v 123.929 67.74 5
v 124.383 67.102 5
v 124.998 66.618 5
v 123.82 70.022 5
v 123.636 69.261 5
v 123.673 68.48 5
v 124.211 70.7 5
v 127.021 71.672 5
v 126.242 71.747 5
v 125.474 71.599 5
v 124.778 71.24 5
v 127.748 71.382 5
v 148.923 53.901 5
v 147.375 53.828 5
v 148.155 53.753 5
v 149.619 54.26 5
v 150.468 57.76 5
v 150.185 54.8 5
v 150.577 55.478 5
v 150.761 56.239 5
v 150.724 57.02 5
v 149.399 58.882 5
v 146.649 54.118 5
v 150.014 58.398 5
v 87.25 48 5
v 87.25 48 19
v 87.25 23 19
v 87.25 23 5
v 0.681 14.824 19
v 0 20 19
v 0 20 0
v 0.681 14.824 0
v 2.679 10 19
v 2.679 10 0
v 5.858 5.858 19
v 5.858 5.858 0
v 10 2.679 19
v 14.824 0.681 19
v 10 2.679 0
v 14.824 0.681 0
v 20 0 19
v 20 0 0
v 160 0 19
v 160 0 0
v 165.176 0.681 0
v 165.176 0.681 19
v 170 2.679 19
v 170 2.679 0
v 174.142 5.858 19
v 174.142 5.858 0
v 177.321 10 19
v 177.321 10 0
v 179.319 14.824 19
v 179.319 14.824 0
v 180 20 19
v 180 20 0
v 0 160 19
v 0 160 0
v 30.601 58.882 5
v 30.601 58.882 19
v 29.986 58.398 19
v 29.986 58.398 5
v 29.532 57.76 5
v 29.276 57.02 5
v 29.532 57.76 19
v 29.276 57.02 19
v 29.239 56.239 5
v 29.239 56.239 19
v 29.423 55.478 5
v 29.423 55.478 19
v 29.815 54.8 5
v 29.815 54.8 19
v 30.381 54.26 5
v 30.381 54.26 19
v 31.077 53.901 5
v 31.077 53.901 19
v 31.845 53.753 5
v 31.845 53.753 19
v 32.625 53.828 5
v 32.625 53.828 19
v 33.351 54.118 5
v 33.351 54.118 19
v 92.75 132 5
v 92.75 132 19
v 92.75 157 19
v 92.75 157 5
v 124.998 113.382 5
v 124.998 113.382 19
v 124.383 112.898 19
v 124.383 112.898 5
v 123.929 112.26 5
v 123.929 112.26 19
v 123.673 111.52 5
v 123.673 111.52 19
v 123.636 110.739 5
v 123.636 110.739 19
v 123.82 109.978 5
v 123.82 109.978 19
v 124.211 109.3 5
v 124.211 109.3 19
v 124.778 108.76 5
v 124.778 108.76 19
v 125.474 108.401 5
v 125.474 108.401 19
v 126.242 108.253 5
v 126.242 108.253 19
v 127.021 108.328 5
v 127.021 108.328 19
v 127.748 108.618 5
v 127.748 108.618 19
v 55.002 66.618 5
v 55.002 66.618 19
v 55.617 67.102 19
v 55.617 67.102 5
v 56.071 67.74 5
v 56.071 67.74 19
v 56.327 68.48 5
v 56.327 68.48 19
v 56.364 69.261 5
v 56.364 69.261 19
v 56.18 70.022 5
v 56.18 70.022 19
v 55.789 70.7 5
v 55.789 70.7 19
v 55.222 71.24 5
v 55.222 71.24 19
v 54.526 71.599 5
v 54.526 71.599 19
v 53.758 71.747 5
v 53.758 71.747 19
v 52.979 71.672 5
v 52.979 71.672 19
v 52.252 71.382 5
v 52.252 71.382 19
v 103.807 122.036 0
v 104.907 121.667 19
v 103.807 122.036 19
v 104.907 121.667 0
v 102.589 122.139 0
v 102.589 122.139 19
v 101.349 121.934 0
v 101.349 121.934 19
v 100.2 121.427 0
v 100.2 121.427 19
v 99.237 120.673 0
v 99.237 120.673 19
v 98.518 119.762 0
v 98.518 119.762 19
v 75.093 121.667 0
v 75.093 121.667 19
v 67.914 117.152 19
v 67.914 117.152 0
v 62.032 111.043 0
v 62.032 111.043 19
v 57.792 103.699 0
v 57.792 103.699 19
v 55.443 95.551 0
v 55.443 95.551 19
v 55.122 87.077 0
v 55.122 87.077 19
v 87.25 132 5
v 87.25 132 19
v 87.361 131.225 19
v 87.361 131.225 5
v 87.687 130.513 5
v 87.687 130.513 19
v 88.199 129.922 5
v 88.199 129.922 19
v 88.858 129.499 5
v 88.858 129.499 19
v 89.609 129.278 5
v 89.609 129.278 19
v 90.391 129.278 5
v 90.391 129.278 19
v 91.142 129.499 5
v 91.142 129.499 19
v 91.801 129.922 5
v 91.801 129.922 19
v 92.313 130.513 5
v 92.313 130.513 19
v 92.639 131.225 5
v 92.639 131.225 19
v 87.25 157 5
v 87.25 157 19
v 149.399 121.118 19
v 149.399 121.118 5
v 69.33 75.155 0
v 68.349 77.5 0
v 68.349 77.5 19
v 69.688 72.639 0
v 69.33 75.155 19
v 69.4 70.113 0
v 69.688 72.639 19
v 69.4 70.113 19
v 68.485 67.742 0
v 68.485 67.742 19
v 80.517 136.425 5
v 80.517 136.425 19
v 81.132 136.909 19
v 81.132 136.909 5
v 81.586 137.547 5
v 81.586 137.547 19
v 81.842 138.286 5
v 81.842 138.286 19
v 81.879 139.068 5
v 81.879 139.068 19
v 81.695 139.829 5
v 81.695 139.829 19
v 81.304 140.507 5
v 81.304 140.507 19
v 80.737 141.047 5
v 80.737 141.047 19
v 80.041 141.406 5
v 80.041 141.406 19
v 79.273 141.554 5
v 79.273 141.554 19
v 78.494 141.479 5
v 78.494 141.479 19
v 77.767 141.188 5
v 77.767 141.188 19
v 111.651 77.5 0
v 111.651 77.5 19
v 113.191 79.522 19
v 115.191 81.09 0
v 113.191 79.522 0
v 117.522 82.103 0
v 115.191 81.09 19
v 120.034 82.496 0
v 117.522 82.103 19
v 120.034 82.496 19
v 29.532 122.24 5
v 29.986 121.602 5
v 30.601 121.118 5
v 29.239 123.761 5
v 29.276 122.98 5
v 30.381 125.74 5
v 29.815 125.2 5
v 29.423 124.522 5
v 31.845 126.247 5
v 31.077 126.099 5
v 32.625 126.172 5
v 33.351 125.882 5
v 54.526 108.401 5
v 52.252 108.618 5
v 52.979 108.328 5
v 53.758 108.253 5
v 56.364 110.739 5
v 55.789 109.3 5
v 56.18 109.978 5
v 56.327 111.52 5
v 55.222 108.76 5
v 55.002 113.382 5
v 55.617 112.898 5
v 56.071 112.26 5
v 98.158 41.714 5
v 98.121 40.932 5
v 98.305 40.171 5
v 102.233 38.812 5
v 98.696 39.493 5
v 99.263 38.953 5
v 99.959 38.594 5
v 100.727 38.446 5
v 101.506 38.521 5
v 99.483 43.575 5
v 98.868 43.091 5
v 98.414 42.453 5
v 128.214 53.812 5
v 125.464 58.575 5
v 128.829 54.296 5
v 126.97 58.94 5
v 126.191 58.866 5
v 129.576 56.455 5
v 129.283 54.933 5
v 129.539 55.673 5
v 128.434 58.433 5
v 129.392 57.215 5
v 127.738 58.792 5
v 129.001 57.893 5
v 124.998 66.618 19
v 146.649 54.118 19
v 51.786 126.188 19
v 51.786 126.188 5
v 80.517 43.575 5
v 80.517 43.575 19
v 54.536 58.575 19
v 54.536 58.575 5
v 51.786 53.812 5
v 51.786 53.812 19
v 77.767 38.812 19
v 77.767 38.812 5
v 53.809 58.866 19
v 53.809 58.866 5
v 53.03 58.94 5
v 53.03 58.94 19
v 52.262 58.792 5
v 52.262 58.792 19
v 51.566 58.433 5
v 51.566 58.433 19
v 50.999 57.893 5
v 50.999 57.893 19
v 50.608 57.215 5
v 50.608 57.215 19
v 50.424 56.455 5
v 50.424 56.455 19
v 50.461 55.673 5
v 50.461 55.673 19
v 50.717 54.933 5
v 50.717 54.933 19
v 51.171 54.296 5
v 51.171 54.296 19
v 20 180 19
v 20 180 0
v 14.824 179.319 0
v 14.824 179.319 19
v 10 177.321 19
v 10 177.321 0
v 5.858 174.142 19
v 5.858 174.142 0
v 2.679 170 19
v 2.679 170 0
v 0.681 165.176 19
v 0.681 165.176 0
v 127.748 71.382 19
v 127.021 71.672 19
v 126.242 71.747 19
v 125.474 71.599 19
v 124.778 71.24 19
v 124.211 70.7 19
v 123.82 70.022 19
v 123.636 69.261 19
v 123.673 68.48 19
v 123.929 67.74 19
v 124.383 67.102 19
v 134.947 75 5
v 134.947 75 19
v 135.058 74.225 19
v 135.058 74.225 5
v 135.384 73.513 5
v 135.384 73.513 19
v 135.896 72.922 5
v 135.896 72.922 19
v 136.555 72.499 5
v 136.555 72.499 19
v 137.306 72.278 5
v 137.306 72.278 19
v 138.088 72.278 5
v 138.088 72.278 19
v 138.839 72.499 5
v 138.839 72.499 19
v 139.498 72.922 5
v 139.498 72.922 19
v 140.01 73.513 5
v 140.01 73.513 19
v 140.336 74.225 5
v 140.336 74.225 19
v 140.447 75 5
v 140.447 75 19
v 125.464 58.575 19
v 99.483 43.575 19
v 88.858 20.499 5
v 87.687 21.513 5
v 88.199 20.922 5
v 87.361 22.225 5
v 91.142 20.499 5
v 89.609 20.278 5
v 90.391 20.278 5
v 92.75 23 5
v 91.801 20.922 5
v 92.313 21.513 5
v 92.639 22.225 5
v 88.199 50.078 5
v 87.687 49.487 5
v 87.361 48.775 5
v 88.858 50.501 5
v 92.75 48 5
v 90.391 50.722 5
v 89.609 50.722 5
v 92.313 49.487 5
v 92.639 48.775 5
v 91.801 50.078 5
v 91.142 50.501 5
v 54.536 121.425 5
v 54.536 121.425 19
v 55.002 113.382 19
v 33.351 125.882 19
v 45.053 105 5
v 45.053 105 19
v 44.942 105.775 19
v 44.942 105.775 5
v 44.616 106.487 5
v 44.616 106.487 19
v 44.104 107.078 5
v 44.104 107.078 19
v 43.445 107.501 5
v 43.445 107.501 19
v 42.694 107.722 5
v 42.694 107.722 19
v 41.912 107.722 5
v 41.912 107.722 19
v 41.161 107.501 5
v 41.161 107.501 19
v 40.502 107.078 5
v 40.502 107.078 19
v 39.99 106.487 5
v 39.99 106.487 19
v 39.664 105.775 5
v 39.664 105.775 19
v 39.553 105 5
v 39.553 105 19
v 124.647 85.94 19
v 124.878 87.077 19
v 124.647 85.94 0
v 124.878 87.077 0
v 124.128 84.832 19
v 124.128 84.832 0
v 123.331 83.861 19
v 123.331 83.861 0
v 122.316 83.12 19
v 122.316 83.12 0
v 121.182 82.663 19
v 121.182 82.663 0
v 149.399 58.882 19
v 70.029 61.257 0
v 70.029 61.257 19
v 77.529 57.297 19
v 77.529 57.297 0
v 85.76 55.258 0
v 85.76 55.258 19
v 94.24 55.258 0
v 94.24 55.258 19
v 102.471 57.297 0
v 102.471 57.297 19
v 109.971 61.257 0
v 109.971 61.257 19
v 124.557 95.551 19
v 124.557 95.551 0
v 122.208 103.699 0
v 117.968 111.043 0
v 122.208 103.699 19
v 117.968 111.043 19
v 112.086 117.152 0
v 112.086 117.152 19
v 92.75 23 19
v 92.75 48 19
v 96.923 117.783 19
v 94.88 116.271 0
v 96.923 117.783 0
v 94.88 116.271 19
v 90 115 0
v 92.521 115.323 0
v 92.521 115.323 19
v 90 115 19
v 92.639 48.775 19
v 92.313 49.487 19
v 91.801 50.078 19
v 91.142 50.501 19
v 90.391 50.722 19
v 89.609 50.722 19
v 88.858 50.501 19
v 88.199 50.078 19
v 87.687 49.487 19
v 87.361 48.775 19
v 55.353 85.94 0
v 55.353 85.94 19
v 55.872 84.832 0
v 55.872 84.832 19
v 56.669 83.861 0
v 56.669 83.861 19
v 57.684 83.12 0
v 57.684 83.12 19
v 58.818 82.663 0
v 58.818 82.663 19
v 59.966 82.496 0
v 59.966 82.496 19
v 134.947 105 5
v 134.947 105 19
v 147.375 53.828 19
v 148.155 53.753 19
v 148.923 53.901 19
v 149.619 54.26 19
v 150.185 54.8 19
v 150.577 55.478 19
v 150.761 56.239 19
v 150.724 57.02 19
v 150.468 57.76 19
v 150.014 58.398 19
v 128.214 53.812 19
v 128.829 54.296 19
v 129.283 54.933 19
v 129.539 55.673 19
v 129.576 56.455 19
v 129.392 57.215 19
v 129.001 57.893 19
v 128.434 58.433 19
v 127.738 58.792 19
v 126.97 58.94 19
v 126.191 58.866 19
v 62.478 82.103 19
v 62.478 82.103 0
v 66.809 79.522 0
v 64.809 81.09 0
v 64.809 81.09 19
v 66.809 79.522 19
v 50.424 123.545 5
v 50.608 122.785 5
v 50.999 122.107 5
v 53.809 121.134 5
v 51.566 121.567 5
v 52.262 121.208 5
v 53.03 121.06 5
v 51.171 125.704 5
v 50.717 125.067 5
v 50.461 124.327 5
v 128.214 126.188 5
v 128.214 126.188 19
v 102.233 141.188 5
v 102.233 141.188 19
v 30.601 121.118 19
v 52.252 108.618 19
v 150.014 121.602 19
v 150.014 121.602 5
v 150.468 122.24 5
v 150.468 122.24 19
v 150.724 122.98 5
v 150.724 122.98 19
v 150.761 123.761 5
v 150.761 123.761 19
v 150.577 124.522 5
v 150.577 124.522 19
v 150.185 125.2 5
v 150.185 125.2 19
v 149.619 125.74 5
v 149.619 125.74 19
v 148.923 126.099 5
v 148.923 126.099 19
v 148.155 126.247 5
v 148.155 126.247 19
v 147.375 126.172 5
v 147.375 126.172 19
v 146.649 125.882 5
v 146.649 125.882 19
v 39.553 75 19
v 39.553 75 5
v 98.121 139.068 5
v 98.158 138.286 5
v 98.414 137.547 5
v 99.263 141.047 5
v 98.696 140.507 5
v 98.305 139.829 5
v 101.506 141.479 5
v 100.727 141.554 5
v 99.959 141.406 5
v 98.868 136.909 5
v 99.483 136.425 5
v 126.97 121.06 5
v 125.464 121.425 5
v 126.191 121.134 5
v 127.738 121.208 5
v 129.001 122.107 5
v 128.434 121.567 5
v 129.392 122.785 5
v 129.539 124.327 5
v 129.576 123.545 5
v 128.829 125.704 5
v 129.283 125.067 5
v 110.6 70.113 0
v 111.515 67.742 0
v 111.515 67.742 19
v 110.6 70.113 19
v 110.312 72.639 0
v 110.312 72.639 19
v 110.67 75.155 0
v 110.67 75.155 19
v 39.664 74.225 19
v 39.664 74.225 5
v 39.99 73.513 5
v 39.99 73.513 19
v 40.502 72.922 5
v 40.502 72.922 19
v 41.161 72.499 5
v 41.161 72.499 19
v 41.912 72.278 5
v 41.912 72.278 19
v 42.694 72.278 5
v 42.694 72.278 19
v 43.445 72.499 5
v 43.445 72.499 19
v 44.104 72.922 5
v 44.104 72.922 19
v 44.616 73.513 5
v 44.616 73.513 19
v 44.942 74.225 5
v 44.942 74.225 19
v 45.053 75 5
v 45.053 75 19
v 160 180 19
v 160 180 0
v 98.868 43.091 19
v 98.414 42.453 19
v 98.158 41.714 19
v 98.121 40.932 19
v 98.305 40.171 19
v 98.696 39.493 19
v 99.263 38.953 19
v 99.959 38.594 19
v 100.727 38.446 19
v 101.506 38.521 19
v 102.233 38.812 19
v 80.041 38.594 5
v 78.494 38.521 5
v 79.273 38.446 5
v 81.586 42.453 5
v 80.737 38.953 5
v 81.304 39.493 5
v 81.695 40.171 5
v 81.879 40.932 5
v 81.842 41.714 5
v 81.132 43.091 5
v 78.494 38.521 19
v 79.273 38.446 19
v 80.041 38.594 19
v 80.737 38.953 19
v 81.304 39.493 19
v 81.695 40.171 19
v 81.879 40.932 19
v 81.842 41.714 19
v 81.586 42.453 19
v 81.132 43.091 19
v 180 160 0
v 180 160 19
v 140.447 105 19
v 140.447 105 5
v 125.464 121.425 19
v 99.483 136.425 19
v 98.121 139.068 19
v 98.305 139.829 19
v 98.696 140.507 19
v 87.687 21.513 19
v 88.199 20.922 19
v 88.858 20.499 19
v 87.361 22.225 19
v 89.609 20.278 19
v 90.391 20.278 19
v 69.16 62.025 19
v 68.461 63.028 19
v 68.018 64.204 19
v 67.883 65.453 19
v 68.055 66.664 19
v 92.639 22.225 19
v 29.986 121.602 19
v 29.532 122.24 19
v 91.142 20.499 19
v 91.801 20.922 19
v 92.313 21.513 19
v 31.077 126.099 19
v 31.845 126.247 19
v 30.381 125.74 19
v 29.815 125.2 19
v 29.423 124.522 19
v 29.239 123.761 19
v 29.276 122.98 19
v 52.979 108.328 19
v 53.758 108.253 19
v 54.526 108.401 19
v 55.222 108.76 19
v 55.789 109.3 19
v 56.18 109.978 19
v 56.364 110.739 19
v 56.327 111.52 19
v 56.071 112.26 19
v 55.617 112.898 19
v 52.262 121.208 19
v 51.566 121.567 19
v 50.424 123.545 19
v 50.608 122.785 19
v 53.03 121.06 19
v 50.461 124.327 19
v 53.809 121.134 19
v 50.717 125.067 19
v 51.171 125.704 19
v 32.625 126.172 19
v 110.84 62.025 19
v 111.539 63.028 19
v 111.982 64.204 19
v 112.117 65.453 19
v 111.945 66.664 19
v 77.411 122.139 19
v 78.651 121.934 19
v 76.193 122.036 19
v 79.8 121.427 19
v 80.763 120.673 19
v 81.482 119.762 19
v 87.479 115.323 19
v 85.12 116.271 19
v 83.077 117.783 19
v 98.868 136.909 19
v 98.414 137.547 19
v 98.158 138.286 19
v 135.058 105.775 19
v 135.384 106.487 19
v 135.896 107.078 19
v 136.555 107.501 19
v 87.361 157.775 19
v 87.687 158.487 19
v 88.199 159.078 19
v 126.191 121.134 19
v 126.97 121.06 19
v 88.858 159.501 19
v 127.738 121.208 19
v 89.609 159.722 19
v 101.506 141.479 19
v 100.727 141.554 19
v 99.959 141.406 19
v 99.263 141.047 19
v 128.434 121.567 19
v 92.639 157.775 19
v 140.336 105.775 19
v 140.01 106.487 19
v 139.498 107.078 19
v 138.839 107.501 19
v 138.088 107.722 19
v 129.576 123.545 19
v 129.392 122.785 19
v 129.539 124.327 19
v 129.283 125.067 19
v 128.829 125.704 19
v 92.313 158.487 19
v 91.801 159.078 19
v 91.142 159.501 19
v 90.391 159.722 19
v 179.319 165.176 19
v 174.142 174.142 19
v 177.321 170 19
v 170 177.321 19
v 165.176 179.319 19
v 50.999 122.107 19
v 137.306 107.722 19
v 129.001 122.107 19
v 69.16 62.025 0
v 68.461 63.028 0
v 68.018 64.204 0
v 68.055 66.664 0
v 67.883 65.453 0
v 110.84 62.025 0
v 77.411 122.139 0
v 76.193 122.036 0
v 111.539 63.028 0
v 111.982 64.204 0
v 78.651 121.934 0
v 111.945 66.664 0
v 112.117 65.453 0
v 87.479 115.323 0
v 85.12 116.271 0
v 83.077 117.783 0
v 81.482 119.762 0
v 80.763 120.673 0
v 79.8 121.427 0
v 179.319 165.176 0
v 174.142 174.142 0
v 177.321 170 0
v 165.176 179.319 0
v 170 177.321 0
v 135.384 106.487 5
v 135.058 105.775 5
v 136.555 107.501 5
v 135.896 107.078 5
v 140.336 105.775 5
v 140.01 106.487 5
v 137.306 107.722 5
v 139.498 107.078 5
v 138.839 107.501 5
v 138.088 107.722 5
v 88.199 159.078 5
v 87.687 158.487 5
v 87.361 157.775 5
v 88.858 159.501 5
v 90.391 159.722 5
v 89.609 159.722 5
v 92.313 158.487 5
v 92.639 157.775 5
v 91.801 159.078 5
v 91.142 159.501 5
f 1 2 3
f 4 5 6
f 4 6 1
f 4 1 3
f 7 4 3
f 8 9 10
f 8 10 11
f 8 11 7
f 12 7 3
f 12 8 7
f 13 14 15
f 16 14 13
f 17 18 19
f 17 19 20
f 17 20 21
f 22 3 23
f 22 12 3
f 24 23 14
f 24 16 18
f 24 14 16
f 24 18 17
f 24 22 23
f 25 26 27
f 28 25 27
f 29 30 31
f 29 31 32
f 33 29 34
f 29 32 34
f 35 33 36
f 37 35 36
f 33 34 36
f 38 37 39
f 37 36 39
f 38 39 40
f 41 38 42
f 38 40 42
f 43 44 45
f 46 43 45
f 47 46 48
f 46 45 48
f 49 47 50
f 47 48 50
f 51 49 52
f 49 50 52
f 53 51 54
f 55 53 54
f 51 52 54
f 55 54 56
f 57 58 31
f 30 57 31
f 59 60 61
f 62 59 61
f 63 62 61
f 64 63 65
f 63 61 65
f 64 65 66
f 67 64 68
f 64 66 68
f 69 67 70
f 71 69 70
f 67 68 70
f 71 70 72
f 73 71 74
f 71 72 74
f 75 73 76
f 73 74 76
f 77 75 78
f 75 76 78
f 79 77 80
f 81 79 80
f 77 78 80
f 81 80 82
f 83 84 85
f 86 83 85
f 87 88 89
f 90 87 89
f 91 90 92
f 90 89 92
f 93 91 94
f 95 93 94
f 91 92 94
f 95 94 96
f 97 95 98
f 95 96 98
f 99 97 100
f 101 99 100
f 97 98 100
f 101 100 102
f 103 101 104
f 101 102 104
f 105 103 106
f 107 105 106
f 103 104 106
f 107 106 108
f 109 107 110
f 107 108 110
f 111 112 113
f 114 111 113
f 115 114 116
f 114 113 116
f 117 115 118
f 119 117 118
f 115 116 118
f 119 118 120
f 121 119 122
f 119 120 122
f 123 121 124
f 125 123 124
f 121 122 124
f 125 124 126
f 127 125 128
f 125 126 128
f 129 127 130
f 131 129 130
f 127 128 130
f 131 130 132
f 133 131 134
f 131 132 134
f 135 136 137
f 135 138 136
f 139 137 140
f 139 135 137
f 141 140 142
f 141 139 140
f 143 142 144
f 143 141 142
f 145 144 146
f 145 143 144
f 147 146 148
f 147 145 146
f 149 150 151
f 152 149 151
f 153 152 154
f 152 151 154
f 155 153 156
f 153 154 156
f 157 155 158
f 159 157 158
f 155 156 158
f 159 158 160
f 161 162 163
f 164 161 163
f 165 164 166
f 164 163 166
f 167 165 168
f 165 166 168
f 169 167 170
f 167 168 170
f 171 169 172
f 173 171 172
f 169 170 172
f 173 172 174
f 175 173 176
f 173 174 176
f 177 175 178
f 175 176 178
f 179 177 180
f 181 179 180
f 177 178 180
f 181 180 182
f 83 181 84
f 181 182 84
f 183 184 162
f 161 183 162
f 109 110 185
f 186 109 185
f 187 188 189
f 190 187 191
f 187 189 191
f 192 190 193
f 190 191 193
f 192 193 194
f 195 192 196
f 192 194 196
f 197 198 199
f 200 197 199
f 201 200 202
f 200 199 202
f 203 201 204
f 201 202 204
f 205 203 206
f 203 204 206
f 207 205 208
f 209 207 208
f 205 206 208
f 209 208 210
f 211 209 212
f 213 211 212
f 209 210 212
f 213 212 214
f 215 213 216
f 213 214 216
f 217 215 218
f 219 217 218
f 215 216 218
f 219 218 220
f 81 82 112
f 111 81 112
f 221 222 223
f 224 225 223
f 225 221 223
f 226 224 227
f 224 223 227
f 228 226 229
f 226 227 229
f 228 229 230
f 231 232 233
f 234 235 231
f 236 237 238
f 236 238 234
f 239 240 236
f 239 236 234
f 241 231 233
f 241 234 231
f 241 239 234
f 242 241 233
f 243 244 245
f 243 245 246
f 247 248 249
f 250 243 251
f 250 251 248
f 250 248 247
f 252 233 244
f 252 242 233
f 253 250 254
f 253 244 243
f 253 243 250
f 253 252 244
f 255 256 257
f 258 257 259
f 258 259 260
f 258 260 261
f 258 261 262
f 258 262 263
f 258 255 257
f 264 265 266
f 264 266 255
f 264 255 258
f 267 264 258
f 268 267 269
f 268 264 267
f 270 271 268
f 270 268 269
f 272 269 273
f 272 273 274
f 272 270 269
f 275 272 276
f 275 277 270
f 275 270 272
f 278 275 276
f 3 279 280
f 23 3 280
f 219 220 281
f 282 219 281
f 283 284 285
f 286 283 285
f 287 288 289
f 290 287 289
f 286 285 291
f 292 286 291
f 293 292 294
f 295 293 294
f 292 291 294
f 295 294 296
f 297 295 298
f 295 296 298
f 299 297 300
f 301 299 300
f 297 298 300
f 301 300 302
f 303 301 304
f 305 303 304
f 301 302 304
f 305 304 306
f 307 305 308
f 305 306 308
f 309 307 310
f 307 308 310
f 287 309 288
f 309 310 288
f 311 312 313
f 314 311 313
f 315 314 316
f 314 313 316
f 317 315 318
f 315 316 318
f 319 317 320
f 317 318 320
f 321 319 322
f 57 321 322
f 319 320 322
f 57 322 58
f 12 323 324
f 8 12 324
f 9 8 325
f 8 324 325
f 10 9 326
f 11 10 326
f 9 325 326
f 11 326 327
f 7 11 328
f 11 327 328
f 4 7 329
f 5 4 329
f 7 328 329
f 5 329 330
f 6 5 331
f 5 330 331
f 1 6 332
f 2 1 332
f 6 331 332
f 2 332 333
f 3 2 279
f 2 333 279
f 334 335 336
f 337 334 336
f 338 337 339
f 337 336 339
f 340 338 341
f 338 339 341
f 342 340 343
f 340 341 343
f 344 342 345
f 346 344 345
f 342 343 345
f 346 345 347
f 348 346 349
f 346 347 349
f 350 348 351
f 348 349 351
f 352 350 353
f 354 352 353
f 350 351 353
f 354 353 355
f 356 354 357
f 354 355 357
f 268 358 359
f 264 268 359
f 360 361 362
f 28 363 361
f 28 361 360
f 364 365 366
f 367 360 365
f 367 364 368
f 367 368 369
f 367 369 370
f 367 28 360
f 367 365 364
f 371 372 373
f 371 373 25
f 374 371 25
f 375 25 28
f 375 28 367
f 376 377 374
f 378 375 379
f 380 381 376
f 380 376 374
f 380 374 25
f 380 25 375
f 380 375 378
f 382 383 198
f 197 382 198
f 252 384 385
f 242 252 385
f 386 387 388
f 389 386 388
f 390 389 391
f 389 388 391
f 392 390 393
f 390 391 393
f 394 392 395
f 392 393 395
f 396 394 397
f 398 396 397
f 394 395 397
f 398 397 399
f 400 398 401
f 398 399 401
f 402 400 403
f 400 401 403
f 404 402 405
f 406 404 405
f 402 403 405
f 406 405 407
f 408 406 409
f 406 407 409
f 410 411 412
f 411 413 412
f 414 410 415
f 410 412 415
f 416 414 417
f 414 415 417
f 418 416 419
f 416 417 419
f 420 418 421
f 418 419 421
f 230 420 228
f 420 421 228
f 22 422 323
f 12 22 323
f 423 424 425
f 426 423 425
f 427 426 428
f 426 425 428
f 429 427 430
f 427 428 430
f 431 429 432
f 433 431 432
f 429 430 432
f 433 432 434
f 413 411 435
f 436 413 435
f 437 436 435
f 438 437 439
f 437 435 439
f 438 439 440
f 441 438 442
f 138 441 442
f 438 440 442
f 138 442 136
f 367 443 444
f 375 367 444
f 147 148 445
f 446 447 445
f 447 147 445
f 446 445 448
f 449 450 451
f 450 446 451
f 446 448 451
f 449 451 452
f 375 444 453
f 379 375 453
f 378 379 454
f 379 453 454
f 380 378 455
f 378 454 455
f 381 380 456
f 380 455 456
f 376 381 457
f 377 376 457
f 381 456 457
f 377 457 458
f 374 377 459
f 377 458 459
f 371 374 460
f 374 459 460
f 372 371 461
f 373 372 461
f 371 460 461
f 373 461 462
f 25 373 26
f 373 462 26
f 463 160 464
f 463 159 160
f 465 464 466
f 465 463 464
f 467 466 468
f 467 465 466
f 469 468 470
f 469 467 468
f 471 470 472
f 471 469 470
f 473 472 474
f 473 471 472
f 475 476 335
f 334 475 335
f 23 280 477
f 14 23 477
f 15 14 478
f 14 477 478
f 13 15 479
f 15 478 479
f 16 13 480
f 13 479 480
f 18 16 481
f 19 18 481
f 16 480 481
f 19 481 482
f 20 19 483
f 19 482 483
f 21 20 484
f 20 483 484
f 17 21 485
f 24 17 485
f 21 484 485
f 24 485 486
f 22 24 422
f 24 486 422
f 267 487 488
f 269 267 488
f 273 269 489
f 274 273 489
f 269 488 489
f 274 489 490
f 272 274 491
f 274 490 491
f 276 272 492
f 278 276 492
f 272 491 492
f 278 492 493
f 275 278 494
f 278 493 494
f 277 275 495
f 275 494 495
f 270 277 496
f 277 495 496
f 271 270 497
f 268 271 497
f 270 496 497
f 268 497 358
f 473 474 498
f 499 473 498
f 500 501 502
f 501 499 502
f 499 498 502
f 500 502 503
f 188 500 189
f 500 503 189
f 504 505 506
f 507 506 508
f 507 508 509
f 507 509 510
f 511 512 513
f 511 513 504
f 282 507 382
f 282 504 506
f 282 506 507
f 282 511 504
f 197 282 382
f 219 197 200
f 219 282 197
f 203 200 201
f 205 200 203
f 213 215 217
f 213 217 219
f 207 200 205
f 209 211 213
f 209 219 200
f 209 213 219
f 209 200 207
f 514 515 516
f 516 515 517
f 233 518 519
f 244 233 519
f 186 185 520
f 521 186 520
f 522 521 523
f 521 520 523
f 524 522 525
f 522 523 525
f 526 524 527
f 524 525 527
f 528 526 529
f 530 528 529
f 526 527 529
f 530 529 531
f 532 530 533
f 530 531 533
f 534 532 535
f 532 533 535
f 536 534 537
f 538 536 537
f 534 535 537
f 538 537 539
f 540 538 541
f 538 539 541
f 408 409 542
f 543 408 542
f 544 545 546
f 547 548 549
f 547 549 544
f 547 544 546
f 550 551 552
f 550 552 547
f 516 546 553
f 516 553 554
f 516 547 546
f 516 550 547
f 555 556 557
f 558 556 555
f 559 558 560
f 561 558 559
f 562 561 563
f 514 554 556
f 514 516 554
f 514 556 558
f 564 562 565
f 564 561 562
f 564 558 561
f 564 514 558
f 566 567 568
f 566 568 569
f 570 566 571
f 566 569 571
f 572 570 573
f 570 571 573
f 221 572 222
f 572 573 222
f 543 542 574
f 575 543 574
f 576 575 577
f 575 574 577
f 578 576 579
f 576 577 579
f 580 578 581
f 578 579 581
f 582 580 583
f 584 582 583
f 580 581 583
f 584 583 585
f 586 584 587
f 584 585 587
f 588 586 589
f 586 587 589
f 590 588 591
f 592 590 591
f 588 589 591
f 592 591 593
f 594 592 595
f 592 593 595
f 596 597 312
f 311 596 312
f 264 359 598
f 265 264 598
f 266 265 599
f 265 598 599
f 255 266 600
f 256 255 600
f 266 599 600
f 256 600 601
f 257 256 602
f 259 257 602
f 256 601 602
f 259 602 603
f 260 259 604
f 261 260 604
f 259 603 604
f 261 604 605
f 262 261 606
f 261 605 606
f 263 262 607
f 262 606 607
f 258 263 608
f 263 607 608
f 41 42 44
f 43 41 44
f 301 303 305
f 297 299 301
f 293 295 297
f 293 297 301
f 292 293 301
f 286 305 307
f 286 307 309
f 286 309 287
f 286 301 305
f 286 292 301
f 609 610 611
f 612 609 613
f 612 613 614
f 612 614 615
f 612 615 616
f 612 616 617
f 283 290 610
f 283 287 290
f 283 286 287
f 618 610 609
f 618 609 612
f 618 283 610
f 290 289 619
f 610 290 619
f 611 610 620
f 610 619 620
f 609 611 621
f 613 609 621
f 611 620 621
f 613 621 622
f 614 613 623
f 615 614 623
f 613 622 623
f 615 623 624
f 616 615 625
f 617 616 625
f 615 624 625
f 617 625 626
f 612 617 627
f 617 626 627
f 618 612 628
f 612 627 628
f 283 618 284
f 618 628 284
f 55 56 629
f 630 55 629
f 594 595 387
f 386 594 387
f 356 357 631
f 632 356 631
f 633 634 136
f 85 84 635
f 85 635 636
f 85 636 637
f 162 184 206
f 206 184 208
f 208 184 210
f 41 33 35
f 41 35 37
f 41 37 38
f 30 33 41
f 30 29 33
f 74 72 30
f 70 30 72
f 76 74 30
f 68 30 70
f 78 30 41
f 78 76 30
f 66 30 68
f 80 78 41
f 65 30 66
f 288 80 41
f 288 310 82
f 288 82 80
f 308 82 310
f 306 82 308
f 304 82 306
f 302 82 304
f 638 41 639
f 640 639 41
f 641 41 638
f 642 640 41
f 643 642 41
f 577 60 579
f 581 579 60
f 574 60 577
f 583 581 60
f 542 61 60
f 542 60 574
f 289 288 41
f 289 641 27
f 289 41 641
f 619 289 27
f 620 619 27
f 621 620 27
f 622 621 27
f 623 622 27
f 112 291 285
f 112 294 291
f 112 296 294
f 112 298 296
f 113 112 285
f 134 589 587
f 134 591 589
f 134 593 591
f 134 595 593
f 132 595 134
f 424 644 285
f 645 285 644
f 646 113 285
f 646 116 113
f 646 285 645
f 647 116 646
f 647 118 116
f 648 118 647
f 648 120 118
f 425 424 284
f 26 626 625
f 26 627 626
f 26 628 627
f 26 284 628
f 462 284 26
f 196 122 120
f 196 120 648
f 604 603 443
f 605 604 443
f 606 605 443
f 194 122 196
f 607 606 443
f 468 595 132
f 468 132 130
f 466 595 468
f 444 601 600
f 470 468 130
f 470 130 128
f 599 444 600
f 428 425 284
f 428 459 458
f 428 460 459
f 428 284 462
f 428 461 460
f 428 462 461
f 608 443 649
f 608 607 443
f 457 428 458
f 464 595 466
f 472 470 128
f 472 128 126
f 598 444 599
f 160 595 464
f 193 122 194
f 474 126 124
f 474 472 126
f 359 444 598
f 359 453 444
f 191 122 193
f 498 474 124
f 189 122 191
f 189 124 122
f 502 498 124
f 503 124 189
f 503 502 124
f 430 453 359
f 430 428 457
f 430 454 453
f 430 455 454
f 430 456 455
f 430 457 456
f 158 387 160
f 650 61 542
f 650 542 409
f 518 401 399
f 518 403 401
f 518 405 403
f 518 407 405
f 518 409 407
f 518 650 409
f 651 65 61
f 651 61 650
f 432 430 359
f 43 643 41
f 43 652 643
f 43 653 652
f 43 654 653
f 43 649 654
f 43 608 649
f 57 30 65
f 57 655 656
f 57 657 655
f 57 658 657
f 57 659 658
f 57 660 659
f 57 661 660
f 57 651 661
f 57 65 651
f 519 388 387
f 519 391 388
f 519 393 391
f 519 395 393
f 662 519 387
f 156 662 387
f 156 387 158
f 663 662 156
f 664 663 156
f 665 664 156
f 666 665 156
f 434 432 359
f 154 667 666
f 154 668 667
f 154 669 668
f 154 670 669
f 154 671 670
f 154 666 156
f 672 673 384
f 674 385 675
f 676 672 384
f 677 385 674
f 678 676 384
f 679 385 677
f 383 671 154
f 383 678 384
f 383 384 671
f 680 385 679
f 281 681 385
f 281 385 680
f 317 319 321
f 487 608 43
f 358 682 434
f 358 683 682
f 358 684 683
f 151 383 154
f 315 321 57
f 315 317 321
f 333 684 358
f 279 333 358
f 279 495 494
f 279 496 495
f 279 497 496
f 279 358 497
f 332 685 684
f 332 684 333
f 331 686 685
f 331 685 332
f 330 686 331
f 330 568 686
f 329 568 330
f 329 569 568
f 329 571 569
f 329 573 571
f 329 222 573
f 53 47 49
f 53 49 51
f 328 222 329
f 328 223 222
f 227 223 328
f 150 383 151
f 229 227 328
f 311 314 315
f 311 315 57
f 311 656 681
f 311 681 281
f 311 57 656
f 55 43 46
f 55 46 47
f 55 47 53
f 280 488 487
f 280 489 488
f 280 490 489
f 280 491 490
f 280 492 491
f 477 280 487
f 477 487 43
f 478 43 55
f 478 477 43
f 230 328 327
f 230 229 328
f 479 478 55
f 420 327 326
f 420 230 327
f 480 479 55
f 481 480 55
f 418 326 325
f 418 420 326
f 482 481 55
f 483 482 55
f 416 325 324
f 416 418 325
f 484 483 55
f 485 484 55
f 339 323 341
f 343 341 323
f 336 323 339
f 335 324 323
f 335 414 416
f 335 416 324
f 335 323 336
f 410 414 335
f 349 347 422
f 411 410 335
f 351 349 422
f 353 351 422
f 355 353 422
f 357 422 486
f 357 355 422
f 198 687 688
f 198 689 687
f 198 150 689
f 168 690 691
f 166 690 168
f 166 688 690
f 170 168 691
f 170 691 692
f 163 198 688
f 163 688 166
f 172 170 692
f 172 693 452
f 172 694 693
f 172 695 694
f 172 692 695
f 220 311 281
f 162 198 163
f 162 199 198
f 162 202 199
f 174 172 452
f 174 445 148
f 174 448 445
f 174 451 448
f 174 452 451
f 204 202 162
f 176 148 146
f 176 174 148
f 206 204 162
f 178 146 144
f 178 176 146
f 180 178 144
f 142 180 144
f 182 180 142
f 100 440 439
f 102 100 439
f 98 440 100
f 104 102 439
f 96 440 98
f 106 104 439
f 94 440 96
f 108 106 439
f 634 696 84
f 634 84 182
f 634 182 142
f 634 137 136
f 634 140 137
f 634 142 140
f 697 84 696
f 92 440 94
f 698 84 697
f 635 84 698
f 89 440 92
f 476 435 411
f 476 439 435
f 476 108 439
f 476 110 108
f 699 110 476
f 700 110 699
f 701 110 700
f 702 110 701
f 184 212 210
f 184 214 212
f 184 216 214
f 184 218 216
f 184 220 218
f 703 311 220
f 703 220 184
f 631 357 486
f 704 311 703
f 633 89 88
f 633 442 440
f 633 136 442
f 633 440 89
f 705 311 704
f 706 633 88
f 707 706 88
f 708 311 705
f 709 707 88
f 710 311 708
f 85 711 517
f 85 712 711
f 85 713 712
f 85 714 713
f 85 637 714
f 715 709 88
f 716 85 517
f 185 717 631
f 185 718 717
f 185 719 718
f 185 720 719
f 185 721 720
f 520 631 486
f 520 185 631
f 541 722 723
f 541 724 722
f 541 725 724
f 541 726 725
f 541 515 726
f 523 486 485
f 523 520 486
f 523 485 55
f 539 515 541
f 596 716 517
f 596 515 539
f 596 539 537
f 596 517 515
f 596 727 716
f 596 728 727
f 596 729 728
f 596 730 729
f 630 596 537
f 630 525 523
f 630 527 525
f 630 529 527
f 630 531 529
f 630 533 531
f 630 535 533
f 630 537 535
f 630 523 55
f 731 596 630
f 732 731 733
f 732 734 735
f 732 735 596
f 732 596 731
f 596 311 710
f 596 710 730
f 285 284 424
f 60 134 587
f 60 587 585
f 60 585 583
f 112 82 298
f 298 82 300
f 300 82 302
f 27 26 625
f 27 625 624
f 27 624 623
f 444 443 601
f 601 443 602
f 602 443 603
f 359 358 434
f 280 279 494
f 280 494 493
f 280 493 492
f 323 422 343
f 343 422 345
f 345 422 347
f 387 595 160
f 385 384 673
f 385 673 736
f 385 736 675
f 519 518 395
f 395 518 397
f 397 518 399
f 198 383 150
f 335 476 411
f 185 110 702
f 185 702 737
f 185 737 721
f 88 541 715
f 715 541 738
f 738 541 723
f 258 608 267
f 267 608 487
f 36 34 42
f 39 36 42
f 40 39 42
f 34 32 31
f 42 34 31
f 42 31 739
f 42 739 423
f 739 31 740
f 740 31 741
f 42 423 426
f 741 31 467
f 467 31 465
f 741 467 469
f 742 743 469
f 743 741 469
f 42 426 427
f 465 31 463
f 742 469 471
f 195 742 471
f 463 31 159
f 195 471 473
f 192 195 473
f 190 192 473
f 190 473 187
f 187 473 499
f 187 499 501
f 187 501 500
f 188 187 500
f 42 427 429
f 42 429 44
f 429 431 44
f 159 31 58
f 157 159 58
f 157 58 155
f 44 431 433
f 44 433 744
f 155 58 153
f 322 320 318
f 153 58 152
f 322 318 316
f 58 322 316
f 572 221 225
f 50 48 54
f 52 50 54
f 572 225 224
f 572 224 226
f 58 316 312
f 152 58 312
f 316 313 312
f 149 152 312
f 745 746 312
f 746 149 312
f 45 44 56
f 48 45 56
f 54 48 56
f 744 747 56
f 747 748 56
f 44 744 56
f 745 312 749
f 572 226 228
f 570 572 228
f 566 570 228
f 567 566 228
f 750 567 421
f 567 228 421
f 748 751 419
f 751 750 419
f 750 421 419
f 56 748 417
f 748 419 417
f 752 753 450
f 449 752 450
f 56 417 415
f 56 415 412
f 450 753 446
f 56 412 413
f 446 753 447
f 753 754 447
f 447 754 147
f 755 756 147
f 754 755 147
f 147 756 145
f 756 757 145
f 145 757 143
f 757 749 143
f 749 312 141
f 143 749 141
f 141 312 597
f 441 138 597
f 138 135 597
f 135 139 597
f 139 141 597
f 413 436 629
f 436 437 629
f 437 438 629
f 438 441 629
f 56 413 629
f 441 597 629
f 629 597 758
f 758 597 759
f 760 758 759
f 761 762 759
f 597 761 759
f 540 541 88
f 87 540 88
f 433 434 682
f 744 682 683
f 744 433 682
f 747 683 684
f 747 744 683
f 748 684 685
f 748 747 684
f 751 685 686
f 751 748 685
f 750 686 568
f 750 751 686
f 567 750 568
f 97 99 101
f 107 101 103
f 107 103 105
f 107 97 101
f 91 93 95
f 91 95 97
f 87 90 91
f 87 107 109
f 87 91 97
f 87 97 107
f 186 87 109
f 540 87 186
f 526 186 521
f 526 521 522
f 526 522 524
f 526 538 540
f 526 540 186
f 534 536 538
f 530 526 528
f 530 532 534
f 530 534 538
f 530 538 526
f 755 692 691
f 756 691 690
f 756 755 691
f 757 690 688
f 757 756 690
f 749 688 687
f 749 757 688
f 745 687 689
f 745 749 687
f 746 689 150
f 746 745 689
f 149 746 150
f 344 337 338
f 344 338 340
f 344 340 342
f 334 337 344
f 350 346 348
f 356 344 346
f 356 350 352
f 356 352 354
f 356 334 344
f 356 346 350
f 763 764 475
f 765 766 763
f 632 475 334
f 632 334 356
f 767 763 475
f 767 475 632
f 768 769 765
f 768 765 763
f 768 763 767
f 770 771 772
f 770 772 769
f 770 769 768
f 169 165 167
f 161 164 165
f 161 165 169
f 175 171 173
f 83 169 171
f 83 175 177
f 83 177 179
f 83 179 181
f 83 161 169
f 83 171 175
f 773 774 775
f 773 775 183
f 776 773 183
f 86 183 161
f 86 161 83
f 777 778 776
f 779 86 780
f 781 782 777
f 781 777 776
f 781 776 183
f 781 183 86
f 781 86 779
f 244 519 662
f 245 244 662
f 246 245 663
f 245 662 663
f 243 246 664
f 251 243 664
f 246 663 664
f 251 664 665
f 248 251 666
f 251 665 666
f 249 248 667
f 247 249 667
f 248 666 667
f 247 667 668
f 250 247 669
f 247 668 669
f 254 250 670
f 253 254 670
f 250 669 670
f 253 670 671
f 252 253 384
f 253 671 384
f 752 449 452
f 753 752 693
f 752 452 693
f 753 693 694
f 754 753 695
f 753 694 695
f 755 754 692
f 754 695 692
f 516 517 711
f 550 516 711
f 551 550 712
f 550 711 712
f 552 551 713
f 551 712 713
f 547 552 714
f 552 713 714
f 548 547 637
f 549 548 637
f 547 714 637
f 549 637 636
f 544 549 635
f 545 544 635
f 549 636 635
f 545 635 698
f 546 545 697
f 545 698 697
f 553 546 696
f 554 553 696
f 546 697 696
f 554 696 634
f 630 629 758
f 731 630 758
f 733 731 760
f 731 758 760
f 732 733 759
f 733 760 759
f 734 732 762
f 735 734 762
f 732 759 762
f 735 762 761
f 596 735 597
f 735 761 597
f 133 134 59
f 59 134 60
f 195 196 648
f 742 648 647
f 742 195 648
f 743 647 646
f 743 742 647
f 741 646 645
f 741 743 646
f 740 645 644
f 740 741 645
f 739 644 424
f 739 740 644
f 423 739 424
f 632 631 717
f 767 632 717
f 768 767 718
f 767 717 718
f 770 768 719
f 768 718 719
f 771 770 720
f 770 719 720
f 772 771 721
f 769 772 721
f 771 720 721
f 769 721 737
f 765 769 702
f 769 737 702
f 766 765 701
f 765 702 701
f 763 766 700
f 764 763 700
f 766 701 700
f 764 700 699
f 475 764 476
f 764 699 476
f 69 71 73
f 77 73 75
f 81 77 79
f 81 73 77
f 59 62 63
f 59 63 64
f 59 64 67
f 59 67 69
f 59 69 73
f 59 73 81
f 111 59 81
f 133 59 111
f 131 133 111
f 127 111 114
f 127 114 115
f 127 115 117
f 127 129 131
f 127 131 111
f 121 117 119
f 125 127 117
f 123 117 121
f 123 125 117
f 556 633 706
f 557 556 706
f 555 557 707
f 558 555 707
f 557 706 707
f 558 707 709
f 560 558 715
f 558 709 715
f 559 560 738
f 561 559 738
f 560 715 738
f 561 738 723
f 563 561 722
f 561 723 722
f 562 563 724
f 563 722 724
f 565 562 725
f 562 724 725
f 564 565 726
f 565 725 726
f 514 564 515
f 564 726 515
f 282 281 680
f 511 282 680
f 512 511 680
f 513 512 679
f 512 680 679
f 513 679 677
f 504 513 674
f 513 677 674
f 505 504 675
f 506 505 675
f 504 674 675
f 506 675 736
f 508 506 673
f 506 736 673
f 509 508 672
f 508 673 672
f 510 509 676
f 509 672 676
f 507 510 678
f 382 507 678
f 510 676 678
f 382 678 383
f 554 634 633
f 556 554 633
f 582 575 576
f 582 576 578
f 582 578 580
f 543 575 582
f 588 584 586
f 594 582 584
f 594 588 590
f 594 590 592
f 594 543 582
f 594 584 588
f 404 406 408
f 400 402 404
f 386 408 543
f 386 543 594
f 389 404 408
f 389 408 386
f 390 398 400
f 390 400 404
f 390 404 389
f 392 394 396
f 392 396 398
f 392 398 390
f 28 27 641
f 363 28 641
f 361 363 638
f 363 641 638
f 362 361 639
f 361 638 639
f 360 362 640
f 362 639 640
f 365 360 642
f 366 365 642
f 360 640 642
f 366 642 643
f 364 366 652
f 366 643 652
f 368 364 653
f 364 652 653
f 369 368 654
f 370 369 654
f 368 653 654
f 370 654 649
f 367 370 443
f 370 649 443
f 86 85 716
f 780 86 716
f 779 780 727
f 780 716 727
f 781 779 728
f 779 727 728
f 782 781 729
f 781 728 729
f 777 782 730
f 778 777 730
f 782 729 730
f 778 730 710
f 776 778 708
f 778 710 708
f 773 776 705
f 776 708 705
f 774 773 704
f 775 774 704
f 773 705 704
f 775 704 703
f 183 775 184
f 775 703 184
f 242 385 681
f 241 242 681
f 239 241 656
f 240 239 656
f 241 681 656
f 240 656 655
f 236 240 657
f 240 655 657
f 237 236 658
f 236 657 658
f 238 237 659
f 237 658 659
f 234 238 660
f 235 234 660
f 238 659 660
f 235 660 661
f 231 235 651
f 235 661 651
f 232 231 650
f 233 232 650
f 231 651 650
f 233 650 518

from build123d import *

# Parameters (mm, degrees)
F1_DEPTH = 19
F5_DEPTH = 19.001
F6_DEPTH = 14
F7_R     = 5


with BuildPart() as f1:
    # F0 (on Top) → F1 (new body)
    with BuildSketch(Plane.XY):
        with BuildLine():
            ThreePointArc((0, 20), (5.857864, 5.857864), (20, 0))
            Line((20, 0), (160, 0))
            ThreePointArc((160, 0), (174.142136, 5.857864), (180, 20))
            Line((180, 20), (180, 160))
            ThreePointArc((180, 160), (174.142136, 174.142136), (160, 180))
            Line((160, 180), (20, 180))
            ThreePointArc((20, 180), (5.857864, 174.142136), (0, 160))
            Line((0, 160), (0, 20))
        make_face()
    extrude(amount=F1_DEPTH)

    # F4 (on face) → F5 (cut, through all)
    with BuildSketch(Plane.XY.offset(19)):
        with BuildLine():
            ThreePointArc((124.022427, 81.785714), (120.310889, 107.5), (99.897433, 123.571429))
            ThreePointArc((99.897433, 123.571429), (96.546537, 117.440711), (90, 115))
            ThreePointArc((90, 115), (83.453463, 117.440711), (80.102567, 123.571429))
            ThreePointArc((80.102567, 123.571429), (59.689111, 107.5), (55.977573, 81.785714))
            ThreePointArc((55.977573, 81.785714), (62.962379, 81.949112), (68.349365, 77.5))
            ThreePointArc((68.349365, 77.5), (69.508916, 70.610178), (65.875007, 64.642857))
            ThreePointArc((65.875007, 64.642857), (90, 55), (114.124993, 64.642857))
            ThreePointArc((114.124993, 64.642857), (110.491084, 70.610178), (111.650635, 77.5))
            ThreePointArc((111.650635, 77.5), (117.037621, 81.949112), (124.022427, 81.785714))
        make_face()
    extrude(amount=-F5_DEPTH, mode=Mode.SUBTRACT)

    # F2 (on face) + F3 (on face) → F6 (cut)
    with BuildSketch(Plane.XY.offset(19)):
        with BuildLine():
            ThreePointArc((45.05304, 105), (42.30304, 107.75), (39.55304, 105))
            Line((39.55304, 105), (39.55304, 75))
            ThreePointArc((39.55304, 75), (42.30304, 72.25), (45.05304, 75))
            Line((45.05304, 75), (45.05304, 105))
        make_face()
        with BuildLine():
            ThreePointArc((51.786139, 126.188349), (50.779569, 122.431779), (54.536139, 121.425209))
            Line((54.536139, 121.425209), (80.516901, 136.425209))
            ThreePointArc((80.516901, 136.425209), (81.523471, 140.181779), (77.766901, 141.188349))
            Line((77.766901, 141.188349), (51.786139, 126.188349))
        make_face()
        with BuildLine():
            ThreePointArc((102.233099, 141.188349), (98.476529, 140.181779), (99.483099, 136.425209))
            Line((99.483099, 136.425209), (125.463861, 121.425209))
            ThreePointArc((125.463861, 121.425209), (129.220431, 122.431779), (128.213861, 126.188349))
            Line((128.213861, 126.188349), (102.233099, 141.188349))
        make_face()
        with BuildLine():
            ThreePointArc((140.44696, 105), (137.69696, 107.75), (134.94696, 105))
            Line((134.94696, 105), (134.94696, 75))
            ThreePointArc((134.94696, 75), (137.69696, 72.25), (140.44696, 75))
            Line((140.44696, 75), (140.44696, 105))
        make_face()
        with BuildLine():
            ThreePointArc((128.213861, 53.811651), (129.220431, 57.568221), (125.463861, 58.574791))
            Line((125.463861, 58.574791), (99.483099, 43.574791))
            ThreePointArc((99.483099, 43.574791), (98.476529, 39.818221), (102.233099, 38.811651))
            Line((102.233099, 38.811651), (128.213861, 53.811651))
        make_face()
        with BuildLine():
            ThreePointArc((77.766901, 38.811651), (81.523471, 39.818221), (80.516901, 43.574791))
            Line((80.516901, 43.574791), (54.536139, 58.574791))
            ThreePointArc((54.536139, 58.574791), (50.779569, 57.568221), (51.786139, 53.811651))
            Line((51.786139, 53.811651), (77.766901, 38.811651))
        make_face()
    with BuildSketch(Plane.XY.offset(19)):
        with BuildLine():
            ThreePointArc((87.25, 23), (90, 20.25), (92.75, 23))
            Line((92.75, 23), (92.75, 48))
            ThreePointArc((92.75, 48), (90, 50.75), (87.25, 48))
            Line((87.25, 48), (87.25, 23))
        make_face()
        with BuildLine():
            ThreePointArc((30.601298, 58.88157), (29.594728, 55.125), (33.351298, 54.11843))
            Line((33.351298, 54.11843), (55.001933, 66.61843))
            ThreePointArc((55.001933, 66.61843), (56.008503, 70.375), (52.251933, 71.38157))
            Line((52.251933, 71.38157), (30.601298, 58.88157))
        make_face()
        with BuildLine():
            ThreePointArc((33.351298, 125.88157), (29.594728, 124.875), (30.601298, 121.11843))
            Line((30.601298, 121.11843), (52.251933, 108.61843))
            ThreePointArc((52.251933, 108.61843), (56.008503, 109.625), (55.001933, 113.38157))
            Line((55.001933, 113.38157), (33.351298, 125.88157))
        make_face()
        with BuildLine():
            ThreePointArc((92.75, 157), (90, 159.75), (87.25, 157))
            Line((87.25, 157), (87.25, 132))
            ThreePointArc((87.25, 132), (90, 129.25), (92.75, 132))
            Line((92.75, 132), (92.75, 157))
        make_face()
        with BuildLine():
            ThreePointArc((149.398702, 121.11843), (150.405272, 124.875), (146.648702, 125.88157))
            Line((146.648702, 125.88157), (124.998067, 113.38157))
            ThreePointArc((124.998067, 113.38157), (123.991497, 109.625), (127.748067, 108.61843))
            Line((127.748067, 108.61843), (149.398702, 121.11843))
        make_face()
        with BuildLine():
            ThreePointArc((146.648702, 54.11843), (150.405272, 55.125), (149.398702, 58.88157))
            Line((149.398702, 58.88157), (127.748067, 71.38157))
            ThreePointArc((127.748067, 71.38157), (123.991497, 70.375), (124.998067, 66.61843))
            Line((124.998067, 66.61843), (146.648702, 54.11843))
        make_face()
    extrude(amount=-F6_DEPTH, mode=Mode.SUBTRACT)

    # F7
    f7_edges = [f1.edges().sort_by_distance(p)[0] for p in [
        (80.102567, 123.571429, 9.5),
        (99.897433, 123.571429, 9.5),
        (55.977573, 81.785714, 9.5),
        (65.875007, 64.642857, 9.5),
        (114.124993, 64.642857, 9.5),
        (124.022427, 81.785714, 9.5),
    ]]
    fillet(f7_edges, radius=F7_R)


solid = f1.part
